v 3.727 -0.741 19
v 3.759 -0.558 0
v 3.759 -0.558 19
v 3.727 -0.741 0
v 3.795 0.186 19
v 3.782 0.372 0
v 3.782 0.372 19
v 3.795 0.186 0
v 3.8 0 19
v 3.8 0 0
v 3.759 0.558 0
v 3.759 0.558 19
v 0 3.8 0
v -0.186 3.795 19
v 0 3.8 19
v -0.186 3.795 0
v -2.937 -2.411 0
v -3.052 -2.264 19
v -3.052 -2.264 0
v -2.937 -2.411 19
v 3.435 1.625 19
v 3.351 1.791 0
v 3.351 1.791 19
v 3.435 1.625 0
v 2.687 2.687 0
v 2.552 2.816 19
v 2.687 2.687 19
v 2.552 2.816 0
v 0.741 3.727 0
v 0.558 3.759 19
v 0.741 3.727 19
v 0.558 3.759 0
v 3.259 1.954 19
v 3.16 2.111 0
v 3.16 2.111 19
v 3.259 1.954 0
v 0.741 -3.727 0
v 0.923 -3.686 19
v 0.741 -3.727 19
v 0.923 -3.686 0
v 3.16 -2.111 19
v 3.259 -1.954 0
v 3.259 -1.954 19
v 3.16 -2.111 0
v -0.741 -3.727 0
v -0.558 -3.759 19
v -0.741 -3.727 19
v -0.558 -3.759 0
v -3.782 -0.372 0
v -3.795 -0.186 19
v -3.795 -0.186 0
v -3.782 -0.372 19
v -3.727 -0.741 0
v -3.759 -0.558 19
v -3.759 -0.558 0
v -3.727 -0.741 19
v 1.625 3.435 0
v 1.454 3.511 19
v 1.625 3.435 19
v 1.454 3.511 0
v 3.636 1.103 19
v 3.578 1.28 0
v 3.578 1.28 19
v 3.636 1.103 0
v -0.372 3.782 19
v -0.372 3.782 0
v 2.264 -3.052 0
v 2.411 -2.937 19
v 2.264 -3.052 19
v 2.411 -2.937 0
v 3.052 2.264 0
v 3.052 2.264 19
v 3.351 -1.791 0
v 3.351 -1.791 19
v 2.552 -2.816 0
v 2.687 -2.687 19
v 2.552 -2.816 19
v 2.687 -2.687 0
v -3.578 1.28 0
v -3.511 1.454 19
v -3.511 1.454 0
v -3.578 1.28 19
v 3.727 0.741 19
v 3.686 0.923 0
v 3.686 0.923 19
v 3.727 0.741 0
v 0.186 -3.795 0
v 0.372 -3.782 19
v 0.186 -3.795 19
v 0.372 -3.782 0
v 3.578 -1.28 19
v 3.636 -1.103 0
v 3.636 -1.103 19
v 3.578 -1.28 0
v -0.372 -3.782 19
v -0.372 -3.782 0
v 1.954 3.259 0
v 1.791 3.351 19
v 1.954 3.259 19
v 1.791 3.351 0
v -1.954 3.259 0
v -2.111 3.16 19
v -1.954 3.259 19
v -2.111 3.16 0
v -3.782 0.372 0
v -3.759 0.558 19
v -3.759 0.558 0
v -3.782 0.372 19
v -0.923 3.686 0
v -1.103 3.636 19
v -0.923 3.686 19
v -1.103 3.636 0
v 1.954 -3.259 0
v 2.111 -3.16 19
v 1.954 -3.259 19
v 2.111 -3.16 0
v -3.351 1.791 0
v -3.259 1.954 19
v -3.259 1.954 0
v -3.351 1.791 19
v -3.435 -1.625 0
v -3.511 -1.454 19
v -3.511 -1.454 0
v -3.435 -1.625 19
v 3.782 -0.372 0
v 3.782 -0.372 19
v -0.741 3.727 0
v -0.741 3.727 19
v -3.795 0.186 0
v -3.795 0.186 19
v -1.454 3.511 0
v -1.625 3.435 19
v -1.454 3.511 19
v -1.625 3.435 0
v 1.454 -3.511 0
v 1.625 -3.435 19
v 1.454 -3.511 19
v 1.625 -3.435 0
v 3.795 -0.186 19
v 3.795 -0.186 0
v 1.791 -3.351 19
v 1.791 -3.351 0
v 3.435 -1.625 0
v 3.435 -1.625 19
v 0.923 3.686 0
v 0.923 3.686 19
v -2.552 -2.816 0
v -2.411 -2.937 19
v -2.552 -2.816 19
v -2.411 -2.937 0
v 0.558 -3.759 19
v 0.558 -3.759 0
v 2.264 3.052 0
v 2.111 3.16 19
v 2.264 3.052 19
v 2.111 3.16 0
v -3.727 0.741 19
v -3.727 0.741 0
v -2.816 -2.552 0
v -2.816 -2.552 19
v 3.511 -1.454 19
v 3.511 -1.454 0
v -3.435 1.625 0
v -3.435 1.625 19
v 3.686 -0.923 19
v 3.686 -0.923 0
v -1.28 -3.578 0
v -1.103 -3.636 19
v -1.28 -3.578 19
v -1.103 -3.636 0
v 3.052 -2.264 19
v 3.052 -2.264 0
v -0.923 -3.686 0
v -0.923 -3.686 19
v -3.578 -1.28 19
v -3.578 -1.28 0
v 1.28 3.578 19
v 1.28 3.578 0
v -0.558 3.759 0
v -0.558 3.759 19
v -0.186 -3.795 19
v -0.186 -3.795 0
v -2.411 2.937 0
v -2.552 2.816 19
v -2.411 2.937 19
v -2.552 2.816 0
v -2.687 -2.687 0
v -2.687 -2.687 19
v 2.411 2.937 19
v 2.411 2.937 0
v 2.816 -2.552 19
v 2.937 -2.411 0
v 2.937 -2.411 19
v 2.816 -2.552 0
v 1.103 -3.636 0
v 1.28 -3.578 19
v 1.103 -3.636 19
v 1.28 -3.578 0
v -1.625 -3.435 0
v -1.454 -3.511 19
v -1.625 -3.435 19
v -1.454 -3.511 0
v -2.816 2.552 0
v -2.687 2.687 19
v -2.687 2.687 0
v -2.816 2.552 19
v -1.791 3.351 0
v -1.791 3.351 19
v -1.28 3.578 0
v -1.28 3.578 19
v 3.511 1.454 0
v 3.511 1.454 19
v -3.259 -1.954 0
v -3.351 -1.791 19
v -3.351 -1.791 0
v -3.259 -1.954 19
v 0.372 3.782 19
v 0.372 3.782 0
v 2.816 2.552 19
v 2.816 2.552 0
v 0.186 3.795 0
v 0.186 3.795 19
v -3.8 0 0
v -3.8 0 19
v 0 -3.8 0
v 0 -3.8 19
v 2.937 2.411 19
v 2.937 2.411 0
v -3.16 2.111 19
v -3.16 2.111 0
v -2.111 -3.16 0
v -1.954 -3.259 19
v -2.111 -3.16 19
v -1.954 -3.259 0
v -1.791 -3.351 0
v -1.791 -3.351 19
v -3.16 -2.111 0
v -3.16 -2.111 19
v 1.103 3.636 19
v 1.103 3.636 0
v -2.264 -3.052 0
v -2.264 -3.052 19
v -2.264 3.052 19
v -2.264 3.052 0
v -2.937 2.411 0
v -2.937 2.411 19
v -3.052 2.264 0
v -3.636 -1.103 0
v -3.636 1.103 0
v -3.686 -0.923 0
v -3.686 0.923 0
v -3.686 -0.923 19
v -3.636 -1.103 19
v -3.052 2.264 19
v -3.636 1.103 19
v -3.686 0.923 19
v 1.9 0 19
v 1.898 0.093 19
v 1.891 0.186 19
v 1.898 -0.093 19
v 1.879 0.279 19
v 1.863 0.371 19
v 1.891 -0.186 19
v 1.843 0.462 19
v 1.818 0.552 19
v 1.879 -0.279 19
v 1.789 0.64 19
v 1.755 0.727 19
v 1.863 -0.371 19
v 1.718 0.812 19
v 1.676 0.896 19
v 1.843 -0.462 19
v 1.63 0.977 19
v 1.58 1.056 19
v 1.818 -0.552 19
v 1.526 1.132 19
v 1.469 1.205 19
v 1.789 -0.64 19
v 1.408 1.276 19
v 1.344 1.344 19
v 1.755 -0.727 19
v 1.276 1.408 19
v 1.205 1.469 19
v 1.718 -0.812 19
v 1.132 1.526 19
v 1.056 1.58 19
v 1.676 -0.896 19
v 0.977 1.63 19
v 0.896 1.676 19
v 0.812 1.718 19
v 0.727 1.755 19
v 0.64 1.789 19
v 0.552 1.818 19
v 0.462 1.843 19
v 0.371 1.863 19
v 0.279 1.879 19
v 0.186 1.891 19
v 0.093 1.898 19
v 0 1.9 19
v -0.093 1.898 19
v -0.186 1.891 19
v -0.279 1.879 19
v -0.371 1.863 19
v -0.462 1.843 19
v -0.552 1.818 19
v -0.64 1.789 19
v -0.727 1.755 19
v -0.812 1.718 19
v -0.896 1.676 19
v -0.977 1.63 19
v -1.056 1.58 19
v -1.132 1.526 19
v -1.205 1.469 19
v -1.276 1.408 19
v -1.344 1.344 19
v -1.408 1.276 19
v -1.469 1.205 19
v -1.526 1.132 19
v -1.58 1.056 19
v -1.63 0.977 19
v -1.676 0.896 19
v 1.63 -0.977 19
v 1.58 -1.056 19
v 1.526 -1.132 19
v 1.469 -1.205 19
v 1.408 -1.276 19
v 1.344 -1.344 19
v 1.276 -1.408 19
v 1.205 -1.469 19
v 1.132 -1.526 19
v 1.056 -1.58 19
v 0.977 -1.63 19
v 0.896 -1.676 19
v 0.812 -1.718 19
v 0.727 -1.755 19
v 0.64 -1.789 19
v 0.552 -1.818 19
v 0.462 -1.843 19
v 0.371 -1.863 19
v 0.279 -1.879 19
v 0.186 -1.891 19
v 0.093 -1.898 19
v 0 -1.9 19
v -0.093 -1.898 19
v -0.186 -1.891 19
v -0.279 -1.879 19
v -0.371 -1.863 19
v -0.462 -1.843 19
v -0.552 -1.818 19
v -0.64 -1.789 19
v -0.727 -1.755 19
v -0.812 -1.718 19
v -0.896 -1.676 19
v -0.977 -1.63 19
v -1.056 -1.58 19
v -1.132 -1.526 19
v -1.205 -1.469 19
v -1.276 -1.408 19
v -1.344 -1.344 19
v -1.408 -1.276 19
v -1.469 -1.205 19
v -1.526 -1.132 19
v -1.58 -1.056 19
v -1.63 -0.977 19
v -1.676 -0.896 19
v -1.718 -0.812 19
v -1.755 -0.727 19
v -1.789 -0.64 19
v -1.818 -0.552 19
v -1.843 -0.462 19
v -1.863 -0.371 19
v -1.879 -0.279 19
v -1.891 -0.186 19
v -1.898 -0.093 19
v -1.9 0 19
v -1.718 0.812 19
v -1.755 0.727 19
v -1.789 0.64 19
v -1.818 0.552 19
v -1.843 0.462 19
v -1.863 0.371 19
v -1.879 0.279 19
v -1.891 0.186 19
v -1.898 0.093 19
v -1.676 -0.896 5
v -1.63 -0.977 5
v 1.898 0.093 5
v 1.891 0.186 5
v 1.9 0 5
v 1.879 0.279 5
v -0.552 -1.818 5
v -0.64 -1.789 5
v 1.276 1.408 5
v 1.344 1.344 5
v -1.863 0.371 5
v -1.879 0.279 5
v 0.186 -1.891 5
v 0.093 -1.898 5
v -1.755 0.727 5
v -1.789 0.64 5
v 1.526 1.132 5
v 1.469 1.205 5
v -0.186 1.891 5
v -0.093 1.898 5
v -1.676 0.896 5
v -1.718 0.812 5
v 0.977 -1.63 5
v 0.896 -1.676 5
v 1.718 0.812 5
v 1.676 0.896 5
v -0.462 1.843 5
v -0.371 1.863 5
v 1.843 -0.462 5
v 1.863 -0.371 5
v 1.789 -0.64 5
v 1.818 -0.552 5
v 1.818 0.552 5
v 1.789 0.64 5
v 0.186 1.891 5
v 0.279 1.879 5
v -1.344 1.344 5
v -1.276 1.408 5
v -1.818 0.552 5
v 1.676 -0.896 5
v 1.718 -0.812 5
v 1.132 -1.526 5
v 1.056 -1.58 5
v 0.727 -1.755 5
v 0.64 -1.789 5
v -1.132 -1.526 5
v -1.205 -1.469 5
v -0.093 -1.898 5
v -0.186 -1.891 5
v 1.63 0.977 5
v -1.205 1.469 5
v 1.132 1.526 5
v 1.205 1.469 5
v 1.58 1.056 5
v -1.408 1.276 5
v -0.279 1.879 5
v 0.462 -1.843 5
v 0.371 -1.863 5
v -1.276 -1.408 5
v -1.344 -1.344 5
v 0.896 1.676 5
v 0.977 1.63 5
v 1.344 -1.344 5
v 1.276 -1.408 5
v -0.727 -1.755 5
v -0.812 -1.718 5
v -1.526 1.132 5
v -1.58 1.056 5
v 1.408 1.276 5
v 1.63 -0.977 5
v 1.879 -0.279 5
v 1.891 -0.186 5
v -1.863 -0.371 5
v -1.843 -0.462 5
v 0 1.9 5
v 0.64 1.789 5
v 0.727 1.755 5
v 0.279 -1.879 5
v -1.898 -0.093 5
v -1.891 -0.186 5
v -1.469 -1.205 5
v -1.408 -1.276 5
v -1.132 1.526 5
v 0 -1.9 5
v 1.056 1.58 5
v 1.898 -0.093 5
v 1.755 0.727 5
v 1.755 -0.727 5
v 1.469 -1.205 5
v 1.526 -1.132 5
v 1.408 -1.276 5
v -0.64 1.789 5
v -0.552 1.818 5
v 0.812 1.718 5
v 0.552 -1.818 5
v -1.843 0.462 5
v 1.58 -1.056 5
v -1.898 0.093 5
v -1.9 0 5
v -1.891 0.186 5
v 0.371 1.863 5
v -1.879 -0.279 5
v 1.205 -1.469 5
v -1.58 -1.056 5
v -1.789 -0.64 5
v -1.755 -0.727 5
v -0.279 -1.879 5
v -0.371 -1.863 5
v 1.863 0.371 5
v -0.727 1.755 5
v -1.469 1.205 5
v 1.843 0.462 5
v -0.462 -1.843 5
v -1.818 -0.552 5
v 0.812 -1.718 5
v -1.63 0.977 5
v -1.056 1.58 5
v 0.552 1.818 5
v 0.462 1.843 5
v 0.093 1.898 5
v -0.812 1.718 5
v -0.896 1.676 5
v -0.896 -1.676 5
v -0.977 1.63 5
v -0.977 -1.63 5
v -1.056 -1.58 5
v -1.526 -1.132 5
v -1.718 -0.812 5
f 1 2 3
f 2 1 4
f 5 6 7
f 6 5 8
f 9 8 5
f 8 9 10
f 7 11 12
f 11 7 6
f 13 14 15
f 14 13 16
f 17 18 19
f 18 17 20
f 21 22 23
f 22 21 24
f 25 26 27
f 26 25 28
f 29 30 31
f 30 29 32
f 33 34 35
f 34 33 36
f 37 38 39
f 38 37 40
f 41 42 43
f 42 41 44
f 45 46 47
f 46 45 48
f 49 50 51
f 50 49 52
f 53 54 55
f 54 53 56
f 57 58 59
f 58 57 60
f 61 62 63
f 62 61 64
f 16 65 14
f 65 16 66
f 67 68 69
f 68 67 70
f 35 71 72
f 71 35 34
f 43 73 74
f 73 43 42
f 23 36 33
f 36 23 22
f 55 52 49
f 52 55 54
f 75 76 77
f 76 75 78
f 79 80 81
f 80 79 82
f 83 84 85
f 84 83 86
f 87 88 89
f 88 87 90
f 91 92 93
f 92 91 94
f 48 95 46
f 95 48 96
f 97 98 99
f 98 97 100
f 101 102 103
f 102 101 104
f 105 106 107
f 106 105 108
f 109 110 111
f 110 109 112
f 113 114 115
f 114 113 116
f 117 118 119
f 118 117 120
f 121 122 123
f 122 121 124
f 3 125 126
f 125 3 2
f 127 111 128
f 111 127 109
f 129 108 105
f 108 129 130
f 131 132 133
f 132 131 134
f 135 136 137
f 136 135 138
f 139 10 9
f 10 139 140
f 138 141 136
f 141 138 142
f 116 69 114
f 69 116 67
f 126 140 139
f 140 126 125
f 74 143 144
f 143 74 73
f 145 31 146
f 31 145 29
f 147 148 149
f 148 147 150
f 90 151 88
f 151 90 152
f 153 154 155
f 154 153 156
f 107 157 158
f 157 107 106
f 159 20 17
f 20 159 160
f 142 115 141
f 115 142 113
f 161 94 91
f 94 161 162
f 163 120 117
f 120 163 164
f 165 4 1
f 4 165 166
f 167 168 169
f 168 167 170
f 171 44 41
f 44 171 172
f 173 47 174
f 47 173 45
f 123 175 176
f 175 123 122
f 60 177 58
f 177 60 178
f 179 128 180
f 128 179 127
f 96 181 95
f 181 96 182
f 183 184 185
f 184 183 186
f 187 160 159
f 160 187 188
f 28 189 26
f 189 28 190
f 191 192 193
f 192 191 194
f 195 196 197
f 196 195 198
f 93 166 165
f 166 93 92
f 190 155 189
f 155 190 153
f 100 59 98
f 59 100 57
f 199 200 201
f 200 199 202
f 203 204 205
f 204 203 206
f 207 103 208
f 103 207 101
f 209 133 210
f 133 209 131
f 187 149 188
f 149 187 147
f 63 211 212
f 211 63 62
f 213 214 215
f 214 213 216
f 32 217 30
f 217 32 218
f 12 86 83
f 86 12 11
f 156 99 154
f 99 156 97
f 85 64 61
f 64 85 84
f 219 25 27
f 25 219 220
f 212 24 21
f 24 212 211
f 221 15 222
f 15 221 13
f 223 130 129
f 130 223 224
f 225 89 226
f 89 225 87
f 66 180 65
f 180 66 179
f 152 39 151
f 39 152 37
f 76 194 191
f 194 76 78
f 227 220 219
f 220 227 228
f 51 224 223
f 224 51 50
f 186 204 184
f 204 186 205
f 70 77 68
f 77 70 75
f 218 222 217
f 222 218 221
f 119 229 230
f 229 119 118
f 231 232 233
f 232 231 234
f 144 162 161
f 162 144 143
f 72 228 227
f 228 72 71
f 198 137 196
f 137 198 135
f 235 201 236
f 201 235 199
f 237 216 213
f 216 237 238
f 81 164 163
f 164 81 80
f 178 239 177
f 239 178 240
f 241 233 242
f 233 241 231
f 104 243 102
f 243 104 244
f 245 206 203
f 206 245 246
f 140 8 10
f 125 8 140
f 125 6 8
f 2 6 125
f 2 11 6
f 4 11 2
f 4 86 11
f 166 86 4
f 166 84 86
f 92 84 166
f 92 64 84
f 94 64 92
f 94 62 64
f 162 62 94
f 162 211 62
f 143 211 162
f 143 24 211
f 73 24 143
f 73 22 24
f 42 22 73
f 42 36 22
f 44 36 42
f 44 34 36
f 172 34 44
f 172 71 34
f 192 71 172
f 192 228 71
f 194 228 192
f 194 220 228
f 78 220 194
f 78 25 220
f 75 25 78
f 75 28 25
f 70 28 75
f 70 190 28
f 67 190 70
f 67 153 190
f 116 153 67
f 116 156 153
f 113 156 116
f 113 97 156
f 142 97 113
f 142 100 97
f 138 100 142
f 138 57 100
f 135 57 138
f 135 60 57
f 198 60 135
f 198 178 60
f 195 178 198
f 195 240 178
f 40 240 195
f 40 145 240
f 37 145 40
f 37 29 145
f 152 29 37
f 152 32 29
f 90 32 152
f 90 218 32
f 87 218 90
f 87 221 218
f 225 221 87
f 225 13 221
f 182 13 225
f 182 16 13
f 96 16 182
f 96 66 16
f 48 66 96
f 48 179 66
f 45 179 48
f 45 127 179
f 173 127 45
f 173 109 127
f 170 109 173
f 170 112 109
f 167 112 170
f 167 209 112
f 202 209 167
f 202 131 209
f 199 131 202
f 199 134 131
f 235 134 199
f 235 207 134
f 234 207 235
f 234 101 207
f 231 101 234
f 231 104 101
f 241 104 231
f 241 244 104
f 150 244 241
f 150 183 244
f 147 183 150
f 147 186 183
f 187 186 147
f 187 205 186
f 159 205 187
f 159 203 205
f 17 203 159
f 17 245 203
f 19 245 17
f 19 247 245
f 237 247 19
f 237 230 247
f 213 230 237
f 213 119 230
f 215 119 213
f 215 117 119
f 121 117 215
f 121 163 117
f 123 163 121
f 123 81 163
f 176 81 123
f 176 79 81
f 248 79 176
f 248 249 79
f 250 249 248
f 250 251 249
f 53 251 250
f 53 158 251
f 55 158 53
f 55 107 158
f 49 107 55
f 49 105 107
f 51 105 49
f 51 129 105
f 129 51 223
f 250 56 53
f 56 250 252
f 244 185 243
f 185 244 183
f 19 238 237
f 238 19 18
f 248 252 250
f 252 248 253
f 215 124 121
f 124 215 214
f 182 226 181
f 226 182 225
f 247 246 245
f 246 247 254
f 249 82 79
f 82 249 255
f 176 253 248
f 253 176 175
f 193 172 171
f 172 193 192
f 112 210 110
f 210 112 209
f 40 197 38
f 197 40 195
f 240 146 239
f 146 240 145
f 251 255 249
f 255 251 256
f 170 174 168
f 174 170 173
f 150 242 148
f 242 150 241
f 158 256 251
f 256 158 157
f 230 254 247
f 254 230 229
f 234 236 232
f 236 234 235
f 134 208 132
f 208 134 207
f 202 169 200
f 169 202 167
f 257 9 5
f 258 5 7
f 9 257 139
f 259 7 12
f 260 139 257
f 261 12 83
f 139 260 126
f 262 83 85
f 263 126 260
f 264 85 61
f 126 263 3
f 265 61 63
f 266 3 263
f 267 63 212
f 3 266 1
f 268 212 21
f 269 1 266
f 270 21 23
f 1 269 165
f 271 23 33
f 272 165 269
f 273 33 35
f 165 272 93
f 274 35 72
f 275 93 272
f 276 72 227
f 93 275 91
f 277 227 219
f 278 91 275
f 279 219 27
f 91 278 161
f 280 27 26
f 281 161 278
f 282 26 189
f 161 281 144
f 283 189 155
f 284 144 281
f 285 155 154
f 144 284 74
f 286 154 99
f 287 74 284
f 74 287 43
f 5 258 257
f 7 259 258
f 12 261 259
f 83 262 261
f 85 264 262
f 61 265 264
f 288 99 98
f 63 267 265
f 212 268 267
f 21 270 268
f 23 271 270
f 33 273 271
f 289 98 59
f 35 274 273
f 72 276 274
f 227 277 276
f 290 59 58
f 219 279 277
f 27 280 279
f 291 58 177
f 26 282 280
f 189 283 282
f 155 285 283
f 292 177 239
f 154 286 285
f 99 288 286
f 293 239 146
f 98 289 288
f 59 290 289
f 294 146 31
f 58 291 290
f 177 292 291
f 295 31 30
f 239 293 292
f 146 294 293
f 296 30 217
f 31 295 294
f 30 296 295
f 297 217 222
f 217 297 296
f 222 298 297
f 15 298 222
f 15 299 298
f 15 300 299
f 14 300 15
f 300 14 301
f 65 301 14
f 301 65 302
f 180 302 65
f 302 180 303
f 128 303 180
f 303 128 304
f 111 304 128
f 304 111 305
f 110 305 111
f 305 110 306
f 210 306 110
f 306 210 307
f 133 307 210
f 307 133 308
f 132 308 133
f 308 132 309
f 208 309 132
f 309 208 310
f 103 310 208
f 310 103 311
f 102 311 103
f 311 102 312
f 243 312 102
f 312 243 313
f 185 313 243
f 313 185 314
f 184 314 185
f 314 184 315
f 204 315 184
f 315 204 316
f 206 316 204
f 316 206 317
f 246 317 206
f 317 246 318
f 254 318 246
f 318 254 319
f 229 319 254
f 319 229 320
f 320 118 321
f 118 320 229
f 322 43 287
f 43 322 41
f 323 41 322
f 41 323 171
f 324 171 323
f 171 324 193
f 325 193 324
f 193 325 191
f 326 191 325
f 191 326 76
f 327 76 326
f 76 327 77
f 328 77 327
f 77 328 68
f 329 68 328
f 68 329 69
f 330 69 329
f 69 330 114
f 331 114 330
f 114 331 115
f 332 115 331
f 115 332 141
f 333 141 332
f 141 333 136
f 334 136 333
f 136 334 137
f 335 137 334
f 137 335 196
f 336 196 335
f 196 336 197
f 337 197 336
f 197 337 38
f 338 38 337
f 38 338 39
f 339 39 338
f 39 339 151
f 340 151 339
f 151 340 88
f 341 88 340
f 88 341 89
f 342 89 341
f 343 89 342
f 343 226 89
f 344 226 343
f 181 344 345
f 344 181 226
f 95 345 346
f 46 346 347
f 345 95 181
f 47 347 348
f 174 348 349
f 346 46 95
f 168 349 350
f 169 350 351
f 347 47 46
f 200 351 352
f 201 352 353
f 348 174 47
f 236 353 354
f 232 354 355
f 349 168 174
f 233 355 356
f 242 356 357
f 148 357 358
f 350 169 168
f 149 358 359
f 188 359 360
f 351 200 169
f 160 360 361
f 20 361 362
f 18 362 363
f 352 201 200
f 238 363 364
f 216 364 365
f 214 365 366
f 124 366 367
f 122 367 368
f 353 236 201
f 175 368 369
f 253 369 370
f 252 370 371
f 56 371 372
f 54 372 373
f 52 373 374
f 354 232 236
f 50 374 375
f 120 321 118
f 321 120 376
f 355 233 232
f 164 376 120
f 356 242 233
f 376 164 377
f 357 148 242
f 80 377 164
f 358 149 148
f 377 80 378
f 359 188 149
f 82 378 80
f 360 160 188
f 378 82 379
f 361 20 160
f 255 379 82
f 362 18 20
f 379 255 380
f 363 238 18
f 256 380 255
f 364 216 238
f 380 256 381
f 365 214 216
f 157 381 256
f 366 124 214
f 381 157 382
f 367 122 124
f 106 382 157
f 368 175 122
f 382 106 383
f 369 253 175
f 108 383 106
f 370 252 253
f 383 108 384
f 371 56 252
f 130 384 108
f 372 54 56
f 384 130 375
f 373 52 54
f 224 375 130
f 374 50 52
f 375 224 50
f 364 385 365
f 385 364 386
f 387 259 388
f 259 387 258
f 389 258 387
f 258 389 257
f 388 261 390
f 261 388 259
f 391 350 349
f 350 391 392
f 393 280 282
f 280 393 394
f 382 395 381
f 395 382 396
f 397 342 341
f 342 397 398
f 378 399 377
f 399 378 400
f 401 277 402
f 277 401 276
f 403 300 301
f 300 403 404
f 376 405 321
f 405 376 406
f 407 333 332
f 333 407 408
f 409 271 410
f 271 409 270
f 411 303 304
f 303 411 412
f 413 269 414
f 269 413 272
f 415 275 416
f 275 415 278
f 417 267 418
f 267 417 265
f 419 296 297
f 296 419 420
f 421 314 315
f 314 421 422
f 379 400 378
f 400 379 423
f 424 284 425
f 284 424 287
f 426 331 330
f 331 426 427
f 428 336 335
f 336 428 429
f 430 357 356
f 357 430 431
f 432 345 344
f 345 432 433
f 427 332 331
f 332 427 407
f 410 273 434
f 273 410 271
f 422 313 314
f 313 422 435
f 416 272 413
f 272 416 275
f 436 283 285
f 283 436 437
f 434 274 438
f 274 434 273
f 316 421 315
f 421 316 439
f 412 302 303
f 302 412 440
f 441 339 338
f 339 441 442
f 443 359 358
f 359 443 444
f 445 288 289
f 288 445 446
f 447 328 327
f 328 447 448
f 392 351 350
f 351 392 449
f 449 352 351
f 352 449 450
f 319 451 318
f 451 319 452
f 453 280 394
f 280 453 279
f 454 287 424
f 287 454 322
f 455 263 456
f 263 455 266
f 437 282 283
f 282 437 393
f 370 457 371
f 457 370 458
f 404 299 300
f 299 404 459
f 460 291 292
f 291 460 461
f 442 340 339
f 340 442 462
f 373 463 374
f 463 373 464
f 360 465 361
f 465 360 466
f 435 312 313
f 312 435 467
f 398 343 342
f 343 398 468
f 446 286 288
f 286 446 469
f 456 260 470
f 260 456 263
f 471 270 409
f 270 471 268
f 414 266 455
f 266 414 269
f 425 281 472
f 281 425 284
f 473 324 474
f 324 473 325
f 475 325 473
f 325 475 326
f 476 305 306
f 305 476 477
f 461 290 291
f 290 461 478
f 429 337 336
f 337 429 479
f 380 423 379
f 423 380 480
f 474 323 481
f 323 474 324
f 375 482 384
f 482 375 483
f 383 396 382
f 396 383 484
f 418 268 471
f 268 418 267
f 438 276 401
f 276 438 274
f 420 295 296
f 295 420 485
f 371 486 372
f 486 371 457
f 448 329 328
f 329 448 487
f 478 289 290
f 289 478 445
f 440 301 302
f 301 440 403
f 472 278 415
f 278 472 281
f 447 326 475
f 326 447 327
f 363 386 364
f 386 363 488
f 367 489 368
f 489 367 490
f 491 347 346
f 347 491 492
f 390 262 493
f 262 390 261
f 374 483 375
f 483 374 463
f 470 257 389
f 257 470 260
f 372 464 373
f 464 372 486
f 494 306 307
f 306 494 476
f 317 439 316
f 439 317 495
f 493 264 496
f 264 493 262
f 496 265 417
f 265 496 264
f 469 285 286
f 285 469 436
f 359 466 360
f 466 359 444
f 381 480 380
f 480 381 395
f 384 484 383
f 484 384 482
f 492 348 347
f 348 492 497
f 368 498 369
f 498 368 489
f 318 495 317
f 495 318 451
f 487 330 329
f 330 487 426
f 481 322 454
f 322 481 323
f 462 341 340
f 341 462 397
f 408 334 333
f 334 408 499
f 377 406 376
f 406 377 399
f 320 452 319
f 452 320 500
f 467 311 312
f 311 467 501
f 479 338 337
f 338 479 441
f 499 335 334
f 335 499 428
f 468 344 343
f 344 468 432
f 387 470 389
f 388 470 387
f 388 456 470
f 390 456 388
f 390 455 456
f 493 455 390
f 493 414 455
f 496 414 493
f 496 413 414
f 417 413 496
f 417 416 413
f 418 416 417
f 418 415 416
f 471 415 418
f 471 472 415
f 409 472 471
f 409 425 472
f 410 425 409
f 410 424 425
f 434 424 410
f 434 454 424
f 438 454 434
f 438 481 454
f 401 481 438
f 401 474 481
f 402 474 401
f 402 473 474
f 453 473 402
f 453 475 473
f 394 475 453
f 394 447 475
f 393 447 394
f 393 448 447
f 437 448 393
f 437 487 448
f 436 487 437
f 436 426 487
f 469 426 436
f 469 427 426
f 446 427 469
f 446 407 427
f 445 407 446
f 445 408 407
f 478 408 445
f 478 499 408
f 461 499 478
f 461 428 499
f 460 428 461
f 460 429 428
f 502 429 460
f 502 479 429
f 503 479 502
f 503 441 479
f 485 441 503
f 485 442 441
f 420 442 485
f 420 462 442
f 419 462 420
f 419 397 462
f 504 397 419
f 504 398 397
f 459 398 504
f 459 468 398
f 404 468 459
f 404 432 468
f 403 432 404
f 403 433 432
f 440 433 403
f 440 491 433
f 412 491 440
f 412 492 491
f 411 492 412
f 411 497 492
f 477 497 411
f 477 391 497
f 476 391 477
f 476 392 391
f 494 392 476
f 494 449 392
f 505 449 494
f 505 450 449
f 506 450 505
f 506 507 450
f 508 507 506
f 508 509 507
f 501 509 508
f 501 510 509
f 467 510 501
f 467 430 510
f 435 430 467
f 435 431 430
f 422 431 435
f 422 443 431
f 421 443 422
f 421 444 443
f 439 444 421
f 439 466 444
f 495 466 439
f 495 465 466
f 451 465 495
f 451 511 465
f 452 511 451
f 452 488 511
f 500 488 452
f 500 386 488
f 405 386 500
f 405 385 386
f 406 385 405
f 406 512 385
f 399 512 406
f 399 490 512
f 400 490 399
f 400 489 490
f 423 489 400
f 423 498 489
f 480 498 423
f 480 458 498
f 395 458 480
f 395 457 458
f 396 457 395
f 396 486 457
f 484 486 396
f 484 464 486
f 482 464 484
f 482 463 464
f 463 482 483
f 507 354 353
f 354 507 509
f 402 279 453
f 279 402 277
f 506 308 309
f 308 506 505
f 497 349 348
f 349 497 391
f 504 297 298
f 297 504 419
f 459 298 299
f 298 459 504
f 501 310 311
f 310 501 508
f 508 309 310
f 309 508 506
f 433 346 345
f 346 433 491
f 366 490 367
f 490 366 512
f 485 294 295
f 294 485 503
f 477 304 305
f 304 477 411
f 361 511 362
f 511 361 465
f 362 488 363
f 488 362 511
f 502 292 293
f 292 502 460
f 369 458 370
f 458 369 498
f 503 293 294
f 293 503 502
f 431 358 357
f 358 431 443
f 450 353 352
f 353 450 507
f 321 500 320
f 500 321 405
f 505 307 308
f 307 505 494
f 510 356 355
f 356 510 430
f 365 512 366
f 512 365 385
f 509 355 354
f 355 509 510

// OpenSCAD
// ПК8010 Корвет right-side button. All dimensions are in millimetres.
// Print standing on the closed end, with the bore facing upward.

outer_diameter = 7.6;
wall_thickness = 1.9;
length = 19;
bore_depth = 14;

bore_diameter = outer_diameter - 2 * wall_thickness;
end_thickness = length - bore_depth;
epsilon = 0.01;
$fn = 128;

assert(bore_diameter > 0 && wall_thickness > 0);
assert(bore_depth > 0 && end_thickness > 0);

difference() {
    cylinder(d = outer_diameter, h = length);
    translate([0, 0, end_thickness])
        cylinder(d = bore_diameter, h = bore_depth + epsilon);
}
